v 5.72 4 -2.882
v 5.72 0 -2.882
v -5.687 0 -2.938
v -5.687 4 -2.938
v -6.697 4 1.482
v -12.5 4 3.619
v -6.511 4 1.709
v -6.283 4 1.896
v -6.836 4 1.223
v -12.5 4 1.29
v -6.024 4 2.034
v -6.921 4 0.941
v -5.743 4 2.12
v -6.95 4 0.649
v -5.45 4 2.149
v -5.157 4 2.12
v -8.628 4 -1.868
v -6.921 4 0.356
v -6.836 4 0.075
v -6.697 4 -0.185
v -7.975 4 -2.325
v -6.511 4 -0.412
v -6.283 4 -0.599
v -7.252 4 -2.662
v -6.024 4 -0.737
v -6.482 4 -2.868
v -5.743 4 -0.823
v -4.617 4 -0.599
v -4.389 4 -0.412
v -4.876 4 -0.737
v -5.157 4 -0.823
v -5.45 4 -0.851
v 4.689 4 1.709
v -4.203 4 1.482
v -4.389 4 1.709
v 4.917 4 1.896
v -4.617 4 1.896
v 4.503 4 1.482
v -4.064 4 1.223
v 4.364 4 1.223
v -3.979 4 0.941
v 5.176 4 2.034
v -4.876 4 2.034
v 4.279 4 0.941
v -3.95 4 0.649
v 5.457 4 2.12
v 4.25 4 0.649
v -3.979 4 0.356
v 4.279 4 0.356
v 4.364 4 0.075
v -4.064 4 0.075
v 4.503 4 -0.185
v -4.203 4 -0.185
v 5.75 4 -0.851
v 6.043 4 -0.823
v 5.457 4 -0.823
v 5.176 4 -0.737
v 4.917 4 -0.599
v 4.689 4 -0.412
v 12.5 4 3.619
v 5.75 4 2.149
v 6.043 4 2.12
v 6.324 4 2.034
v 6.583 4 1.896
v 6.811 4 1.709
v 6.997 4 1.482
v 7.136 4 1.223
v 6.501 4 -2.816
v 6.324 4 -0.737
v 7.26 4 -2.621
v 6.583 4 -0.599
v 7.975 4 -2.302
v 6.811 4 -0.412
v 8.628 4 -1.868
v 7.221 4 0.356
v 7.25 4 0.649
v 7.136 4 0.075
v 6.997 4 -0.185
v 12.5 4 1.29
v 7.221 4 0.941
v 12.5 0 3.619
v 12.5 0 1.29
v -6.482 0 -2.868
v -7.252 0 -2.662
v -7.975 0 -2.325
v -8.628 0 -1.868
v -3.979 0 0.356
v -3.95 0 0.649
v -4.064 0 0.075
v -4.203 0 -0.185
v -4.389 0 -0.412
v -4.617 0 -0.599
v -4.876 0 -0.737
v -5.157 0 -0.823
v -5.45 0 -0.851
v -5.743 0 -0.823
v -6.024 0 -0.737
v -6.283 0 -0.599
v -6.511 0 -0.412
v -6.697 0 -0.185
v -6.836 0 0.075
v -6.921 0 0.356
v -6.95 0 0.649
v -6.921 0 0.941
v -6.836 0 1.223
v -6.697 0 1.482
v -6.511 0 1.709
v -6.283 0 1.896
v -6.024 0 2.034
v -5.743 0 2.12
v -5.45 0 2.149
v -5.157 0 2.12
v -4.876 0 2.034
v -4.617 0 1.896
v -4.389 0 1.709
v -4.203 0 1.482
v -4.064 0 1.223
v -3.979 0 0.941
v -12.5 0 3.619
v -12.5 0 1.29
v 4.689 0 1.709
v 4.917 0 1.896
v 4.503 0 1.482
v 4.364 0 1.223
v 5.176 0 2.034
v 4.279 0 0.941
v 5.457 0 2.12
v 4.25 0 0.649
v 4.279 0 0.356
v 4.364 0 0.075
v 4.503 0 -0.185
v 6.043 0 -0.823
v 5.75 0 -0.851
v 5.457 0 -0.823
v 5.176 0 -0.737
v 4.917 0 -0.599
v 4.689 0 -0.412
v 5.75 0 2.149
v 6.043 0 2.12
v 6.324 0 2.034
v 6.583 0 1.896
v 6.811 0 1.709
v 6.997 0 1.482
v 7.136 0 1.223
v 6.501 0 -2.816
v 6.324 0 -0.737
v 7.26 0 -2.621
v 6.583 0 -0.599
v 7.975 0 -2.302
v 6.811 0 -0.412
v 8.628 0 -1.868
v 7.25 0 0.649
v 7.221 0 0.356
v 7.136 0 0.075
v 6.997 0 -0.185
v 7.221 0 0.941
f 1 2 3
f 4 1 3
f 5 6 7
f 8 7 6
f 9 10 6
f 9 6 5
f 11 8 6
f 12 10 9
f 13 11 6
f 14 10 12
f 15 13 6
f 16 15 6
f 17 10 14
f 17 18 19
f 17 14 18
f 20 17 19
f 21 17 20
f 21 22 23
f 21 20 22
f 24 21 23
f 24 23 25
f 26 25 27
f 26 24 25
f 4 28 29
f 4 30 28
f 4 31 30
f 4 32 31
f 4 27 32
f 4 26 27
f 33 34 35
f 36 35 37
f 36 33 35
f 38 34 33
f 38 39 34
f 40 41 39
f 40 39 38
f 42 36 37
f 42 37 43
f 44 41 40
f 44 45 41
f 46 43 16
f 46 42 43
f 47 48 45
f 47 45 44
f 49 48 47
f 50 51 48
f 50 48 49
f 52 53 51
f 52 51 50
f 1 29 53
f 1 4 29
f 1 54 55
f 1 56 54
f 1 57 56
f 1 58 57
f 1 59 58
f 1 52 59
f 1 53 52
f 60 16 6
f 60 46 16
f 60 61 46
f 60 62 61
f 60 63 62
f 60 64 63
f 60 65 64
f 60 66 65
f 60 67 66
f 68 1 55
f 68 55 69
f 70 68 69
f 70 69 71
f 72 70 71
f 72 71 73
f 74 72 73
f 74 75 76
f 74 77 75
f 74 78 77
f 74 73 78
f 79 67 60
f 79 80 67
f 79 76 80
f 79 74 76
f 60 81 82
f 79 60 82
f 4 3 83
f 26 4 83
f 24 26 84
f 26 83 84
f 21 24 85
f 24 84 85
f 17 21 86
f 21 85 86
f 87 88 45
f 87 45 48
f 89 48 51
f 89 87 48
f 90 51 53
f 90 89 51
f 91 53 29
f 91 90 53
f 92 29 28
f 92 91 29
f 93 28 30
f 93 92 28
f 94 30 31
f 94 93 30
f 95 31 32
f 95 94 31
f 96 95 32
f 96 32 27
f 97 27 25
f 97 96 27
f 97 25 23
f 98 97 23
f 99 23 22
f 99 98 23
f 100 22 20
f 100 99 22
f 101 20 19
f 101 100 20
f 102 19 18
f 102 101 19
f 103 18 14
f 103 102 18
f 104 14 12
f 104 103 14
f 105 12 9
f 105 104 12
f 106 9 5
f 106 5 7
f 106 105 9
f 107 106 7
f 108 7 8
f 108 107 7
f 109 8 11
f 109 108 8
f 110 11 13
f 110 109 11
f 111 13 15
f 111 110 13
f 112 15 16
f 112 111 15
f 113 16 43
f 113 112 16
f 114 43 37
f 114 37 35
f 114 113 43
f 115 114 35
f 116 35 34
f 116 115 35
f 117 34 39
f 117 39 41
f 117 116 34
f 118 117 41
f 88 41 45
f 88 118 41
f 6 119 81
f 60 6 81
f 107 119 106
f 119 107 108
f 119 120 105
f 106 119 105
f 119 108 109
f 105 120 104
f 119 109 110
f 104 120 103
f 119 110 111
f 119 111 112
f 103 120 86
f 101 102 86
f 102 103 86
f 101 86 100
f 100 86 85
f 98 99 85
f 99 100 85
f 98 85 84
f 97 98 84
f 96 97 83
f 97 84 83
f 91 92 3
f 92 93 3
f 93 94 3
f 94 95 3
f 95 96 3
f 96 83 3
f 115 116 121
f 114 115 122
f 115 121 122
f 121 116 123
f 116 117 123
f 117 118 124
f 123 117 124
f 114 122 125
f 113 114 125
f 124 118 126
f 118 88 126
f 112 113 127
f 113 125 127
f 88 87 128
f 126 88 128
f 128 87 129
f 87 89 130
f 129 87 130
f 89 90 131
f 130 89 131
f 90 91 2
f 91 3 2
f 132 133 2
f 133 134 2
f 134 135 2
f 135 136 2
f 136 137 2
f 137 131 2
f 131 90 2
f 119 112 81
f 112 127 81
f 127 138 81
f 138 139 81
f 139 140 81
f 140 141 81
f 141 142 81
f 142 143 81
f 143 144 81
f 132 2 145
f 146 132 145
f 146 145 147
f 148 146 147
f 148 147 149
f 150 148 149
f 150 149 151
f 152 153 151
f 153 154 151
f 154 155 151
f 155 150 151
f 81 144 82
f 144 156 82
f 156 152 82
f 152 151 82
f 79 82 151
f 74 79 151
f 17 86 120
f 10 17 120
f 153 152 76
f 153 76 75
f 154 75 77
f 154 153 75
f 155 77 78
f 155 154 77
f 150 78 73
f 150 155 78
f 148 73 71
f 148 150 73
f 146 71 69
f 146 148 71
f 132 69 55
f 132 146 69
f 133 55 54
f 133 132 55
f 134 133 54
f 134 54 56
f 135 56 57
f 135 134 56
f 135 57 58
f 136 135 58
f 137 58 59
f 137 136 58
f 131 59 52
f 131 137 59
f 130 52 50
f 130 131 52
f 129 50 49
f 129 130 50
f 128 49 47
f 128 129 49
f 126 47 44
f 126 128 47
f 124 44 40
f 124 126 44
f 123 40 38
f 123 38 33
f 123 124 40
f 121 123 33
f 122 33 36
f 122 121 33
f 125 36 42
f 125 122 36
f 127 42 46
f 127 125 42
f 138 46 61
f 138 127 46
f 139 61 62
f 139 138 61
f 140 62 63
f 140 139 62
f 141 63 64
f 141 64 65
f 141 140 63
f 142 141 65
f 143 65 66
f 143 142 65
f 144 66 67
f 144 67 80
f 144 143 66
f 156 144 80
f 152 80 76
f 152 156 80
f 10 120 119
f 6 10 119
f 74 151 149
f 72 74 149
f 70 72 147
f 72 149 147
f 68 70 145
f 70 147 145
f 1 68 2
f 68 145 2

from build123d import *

# Parameters (mm, degrees)
CROQUIS1_R              = 1.499999985
CROQUIS1_R_2            = 1.499999871
SALIENTE_EXTRUIR1_DEPTH = 4


with BuildPart() as part:
    # Croquis1 → Saliente-Extruir1 (new body)
    with BuildSketch(Plane(origin=(0, 0, 0), x_dir=(1, 0, 0), z_dir=(0, 1, 0))):
        with BuildLine():
            Line((-12.499997978, -1.290428922), (-12.499997978, -3.618590638))
            Line((-12.499997978, -3.618590638), (12.500000954, -3.618590638))
            Line((12.500000954, -3.618590638), (12.500000954, -1.290428922))
            Line((12.500000954, -1.290428922), (8.627905846, 1.868327334))
            ThreePointArc((8.627905846, 1.868327334), (7.259690403, 2.621201307), (5.71991749, 2.881839161))
            Line((5.71991749, 2.881839161), (-5.687424356, 2.937856323))
            ThreePointArc((-5.687424356, 2.937856323), (-7.251897096, 2.662171308), (-8.627901793, 1.868327334))
            Line((-8.627901793, 1.868327334), (-12.499997978, -1.290428922))
        make_face()
        with Locations((-5.449998151, -0.648590639)):
            Circle(CROQUIS1_R, mode=Mode.SUBTRACT)
        with Locations((5.750001083, -0.64859061)):
            Circle(CROQUIS1_R_2, mode=Mode.SUBTRACT)
    extrude(amount=SALIENTE_EXTRUIR1_DEPTH)


solid = part.part
